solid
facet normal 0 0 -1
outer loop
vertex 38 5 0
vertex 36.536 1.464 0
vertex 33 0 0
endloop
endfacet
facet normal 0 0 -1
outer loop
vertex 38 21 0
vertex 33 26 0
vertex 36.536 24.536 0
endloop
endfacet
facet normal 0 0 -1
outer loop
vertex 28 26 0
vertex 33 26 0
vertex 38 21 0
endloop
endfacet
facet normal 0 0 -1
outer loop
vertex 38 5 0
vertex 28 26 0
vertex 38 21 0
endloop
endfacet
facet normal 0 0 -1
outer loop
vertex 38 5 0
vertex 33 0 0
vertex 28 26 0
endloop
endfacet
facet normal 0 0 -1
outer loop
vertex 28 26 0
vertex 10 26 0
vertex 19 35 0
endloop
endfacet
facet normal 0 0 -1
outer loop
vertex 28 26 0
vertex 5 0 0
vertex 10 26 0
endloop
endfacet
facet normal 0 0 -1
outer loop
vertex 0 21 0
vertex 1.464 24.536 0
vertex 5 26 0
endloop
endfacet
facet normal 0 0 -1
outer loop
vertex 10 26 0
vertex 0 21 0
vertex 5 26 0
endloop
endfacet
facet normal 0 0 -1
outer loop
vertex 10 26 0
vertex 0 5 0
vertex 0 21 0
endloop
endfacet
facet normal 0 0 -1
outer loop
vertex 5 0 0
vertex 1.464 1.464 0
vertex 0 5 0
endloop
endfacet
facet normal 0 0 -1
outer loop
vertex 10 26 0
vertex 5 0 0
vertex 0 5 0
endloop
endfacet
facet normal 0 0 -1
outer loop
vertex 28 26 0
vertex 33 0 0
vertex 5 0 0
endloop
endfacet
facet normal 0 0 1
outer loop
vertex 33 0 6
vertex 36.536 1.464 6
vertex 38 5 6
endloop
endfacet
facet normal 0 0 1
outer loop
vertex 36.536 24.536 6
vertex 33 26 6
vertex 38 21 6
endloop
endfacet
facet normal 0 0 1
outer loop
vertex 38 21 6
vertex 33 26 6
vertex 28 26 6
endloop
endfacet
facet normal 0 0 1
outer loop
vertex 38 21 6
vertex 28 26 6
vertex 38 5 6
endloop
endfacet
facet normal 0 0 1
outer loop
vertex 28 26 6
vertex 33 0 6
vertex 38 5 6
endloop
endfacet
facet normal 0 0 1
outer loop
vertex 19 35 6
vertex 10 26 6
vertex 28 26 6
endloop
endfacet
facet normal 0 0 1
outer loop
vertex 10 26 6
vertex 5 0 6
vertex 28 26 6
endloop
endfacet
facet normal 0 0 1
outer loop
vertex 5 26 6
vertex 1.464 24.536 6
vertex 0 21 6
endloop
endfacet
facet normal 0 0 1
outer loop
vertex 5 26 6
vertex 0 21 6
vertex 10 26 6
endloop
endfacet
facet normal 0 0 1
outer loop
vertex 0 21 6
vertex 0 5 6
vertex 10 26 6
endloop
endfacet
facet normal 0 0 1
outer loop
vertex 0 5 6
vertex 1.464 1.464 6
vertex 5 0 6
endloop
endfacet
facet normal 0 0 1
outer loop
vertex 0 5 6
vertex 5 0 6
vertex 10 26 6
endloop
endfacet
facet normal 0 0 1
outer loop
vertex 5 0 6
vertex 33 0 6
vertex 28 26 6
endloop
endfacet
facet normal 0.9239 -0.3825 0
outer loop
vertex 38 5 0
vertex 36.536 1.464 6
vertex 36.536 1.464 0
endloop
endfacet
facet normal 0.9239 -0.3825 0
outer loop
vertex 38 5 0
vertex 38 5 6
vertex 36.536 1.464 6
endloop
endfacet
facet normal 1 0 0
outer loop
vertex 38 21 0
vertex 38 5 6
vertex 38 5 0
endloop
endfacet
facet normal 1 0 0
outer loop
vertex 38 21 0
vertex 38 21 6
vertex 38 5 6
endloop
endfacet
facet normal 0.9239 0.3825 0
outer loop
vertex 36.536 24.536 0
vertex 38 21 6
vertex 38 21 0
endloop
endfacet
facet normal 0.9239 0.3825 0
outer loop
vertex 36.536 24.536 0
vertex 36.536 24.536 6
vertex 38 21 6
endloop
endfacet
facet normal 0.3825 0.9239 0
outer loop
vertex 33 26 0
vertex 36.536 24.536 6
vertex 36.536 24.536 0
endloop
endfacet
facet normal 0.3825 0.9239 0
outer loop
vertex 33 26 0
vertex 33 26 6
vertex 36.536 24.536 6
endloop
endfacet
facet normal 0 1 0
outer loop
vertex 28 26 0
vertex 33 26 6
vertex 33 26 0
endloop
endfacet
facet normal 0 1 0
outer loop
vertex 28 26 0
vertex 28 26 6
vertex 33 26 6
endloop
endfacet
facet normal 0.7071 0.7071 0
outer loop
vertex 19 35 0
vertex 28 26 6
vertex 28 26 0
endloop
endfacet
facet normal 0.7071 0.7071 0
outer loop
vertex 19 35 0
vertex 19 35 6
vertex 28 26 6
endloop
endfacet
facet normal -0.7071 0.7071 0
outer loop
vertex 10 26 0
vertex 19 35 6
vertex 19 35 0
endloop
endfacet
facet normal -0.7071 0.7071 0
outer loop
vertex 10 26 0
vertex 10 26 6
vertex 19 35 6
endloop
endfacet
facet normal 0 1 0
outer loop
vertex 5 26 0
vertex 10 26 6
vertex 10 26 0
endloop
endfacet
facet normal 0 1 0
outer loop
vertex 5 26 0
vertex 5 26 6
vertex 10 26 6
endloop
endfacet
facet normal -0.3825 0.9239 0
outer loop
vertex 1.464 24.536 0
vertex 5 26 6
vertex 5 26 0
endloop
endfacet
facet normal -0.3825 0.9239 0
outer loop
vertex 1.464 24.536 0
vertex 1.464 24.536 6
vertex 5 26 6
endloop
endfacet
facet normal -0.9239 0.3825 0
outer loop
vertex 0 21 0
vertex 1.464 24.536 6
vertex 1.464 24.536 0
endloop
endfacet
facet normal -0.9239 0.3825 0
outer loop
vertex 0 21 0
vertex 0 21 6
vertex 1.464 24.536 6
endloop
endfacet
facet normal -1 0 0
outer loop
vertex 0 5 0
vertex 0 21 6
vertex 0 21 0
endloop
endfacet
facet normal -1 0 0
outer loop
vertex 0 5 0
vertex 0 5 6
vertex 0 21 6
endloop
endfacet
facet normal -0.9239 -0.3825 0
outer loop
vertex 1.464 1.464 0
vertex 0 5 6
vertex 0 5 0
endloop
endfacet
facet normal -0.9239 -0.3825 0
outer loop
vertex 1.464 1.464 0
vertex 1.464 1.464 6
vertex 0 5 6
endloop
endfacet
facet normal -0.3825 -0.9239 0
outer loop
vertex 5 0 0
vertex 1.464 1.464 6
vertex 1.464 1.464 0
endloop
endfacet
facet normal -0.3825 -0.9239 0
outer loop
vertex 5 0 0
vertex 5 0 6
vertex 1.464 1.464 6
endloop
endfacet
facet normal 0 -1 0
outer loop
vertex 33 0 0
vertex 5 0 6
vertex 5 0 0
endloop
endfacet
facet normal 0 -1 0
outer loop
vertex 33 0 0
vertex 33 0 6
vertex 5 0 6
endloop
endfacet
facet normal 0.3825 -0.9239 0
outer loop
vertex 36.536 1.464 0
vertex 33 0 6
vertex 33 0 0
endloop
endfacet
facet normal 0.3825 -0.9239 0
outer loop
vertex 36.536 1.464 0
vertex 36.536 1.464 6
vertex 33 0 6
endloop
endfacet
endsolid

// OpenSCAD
$fn = 32;

// ----------------------------------------------------------------------
// Ratchet pawl: 38 x 26 mm body, beak 9 mm сверху
// ----------------------------------------------------------------------

// --- parameters (mm) ---
profile_height = 6;       // extrusion height
profile_points = 15;      // points of the closed outline

profile = [[0, 5], [1.464, 1.464], [5, 0], [33, 0], [36.536, 1.464], [38, 5], [38, 21], [36.536, 24.536], [33, 26], [28, 26], [19, 35], [10, 26], [5, 26], [1.464, 24.536], [0, 21]];  // single closed polygon, 15 points, counter clockwise

// --- the one profile operation ---
linear_extrude(height = profile_height) polygon(points = profile);
